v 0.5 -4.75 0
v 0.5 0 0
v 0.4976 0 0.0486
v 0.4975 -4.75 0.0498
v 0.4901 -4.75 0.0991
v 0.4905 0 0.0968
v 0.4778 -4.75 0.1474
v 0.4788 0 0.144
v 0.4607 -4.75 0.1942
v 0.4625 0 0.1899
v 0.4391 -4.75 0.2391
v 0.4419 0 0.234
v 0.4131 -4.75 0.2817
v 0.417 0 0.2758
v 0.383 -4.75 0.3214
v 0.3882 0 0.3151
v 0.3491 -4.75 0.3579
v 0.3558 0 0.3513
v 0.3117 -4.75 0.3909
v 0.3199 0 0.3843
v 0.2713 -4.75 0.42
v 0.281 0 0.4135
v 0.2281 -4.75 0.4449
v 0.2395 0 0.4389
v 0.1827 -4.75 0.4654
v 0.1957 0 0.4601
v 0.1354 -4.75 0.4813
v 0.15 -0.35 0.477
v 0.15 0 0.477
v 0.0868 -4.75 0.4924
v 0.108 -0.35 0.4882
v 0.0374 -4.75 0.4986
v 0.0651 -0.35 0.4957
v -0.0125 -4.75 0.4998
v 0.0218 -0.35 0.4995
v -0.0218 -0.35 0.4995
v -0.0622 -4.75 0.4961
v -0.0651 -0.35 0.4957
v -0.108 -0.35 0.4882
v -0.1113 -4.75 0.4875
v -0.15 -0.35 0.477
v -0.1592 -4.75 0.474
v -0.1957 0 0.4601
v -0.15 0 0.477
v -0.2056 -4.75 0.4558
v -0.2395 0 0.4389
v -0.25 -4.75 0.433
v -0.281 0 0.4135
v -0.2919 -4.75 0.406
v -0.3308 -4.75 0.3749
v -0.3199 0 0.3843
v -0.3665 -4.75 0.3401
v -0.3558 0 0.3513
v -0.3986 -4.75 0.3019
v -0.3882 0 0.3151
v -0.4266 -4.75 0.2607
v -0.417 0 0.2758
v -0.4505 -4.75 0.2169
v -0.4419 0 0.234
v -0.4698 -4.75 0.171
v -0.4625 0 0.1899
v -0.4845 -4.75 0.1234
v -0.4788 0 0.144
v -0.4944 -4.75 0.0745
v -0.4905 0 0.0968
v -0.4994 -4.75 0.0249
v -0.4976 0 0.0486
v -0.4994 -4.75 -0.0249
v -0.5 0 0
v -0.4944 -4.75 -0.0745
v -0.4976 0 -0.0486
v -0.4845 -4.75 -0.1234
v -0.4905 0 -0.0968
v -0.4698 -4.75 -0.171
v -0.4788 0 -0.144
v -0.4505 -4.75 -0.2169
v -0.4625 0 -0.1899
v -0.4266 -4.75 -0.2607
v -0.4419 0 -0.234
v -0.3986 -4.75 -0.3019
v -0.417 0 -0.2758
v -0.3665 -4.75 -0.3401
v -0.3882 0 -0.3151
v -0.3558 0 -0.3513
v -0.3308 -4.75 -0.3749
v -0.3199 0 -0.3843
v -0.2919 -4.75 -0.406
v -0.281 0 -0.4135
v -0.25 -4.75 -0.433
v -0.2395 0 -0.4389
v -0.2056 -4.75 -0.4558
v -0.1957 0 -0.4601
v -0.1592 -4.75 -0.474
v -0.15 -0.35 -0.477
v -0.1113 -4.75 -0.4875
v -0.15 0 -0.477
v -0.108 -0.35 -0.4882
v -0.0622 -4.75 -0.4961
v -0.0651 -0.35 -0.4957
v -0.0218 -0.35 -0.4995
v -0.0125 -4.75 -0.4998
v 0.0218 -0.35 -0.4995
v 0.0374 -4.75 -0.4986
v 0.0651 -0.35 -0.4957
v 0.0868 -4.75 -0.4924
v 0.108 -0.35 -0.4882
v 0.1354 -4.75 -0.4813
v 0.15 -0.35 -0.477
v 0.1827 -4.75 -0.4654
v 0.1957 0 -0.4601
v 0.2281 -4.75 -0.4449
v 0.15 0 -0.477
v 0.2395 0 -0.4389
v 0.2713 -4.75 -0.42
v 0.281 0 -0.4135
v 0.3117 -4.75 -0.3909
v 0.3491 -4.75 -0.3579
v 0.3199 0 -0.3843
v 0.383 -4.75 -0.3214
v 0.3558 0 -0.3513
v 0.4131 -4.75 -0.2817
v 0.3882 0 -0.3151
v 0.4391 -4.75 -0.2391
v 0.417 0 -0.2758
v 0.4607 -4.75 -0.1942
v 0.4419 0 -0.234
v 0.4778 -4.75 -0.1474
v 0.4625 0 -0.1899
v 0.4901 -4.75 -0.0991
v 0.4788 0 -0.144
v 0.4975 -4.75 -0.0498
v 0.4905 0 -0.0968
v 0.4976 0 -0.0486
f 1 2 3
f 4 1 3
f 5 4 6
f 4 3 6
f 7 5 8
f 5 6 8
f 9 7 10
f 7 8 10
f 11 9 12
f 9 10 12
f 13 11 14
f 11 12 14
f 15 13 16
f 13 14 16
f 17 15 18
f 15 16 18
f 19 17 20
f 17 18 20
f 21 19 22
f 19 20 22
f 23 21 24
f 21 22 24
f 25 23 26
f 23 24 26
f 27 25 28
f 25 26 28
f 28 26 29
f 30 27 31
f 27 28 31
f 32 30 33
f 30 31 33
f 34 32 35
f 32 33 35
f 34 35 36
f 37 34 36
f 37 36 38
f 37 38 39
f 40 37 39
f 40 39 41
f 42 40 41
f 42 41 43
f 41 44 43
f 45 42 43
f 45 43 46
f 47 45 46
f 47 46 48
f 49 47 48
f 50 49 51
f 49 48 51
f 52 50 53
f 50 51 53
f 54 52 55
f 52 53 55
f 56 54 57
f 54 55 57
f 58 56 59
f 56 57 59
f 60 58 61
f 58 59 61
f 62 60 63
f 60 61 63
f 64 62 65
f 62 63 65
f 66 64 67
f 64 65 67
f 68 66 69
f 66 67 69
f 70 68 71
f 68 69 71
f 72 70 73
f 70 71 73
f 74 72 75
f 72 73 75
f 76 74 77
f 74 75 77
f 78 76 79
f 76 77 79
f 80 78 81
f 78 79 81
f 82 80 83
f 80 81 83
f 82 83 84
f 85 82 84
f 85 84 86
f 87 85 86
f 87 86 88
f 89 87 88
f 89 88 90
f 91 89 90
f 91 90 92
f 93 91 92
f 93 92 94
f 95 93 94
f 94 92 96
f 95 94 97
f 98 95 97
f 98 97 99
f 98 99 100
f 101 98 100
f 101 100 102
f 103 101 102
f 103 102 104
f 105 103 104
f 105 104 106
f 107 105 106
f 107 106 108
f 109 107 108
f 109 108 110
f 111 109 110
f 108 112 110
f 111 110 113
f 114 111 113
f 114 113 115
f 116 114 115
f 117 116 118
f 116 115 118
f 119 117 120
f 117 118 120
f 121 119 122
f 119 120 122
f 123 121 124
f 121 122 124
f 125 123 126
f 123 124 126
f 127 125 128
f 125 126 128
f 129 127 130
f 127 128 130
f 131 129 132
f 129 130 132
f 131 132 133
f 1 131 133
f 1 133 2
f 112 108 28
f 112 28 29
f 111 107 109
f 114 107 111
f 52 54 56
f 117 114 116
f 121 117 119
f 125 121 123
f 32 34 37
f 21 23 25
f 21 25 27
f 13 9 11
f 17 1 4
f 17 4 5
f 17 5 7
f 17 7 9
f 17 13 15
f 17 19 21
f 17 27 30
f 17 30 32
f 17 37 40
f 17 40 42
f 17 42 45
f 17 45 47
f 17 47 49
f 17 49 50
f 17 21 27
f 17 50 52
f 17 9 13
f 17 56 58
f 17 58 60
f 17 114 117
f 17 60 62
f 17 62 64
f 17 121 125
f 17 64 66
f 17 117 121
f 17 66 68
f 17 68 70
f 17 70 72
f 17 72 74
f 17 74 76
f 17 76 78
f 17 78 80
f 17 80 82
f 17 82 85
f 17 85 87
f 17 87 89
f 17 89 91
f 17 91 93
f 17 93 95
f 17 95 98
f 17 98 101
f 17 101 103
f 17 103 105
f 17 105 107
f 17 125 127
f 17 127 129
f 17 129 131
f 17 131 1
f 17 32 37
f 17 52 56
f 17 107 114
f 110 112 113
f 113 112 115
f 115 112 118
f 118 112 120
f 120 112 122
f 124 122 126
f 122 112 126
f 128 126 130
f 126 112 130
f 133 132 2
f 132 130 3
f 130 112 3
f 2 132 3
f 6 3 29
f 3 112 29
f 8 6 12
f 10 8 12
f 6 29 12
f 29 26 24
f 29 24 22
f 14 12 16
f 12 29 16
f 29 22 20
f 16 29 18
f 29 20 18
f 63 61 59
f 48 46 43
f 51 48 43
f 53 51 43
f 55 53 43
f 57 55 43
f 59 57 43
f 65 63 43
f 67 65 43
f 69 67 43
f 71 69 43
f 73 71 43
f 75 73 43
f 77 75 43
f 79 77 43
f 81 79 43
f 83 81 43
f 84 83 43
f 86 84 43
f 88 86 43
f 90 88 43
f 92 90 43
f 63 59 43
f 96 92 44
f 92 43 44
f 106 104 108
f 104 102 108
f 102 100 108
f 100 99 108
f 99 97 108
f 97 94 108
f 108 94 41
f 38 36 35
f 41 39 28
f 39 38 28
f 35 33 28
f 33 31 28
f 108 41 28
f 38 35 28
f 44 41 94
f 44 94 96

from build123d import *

# Parameters (mm, degrees)
F0_R     = 0.5
F1_DEPTH = 4.75
F2_W     = 0.3
F2_H     = 0.35
F3_DEPTH = 12.5


with BuildPart() as f1:
    # F0 (on Front) → F1 (new body)
    with BuildSketch(Plane.XZ):
        Circle(F0_R)
    extrude(amount=F1_DEPTH)

    # F2 (on Top) → F3 (cut, symmetric)
    with BuildSketch(Plane.XY):
        with Locations((0, -0.175)):
            Rectangle(F2_W, F2_H)
    extrude(amount=F3_DEPTH, both=True, mode=Mode.SUBTRACT)


solid = f1.part
